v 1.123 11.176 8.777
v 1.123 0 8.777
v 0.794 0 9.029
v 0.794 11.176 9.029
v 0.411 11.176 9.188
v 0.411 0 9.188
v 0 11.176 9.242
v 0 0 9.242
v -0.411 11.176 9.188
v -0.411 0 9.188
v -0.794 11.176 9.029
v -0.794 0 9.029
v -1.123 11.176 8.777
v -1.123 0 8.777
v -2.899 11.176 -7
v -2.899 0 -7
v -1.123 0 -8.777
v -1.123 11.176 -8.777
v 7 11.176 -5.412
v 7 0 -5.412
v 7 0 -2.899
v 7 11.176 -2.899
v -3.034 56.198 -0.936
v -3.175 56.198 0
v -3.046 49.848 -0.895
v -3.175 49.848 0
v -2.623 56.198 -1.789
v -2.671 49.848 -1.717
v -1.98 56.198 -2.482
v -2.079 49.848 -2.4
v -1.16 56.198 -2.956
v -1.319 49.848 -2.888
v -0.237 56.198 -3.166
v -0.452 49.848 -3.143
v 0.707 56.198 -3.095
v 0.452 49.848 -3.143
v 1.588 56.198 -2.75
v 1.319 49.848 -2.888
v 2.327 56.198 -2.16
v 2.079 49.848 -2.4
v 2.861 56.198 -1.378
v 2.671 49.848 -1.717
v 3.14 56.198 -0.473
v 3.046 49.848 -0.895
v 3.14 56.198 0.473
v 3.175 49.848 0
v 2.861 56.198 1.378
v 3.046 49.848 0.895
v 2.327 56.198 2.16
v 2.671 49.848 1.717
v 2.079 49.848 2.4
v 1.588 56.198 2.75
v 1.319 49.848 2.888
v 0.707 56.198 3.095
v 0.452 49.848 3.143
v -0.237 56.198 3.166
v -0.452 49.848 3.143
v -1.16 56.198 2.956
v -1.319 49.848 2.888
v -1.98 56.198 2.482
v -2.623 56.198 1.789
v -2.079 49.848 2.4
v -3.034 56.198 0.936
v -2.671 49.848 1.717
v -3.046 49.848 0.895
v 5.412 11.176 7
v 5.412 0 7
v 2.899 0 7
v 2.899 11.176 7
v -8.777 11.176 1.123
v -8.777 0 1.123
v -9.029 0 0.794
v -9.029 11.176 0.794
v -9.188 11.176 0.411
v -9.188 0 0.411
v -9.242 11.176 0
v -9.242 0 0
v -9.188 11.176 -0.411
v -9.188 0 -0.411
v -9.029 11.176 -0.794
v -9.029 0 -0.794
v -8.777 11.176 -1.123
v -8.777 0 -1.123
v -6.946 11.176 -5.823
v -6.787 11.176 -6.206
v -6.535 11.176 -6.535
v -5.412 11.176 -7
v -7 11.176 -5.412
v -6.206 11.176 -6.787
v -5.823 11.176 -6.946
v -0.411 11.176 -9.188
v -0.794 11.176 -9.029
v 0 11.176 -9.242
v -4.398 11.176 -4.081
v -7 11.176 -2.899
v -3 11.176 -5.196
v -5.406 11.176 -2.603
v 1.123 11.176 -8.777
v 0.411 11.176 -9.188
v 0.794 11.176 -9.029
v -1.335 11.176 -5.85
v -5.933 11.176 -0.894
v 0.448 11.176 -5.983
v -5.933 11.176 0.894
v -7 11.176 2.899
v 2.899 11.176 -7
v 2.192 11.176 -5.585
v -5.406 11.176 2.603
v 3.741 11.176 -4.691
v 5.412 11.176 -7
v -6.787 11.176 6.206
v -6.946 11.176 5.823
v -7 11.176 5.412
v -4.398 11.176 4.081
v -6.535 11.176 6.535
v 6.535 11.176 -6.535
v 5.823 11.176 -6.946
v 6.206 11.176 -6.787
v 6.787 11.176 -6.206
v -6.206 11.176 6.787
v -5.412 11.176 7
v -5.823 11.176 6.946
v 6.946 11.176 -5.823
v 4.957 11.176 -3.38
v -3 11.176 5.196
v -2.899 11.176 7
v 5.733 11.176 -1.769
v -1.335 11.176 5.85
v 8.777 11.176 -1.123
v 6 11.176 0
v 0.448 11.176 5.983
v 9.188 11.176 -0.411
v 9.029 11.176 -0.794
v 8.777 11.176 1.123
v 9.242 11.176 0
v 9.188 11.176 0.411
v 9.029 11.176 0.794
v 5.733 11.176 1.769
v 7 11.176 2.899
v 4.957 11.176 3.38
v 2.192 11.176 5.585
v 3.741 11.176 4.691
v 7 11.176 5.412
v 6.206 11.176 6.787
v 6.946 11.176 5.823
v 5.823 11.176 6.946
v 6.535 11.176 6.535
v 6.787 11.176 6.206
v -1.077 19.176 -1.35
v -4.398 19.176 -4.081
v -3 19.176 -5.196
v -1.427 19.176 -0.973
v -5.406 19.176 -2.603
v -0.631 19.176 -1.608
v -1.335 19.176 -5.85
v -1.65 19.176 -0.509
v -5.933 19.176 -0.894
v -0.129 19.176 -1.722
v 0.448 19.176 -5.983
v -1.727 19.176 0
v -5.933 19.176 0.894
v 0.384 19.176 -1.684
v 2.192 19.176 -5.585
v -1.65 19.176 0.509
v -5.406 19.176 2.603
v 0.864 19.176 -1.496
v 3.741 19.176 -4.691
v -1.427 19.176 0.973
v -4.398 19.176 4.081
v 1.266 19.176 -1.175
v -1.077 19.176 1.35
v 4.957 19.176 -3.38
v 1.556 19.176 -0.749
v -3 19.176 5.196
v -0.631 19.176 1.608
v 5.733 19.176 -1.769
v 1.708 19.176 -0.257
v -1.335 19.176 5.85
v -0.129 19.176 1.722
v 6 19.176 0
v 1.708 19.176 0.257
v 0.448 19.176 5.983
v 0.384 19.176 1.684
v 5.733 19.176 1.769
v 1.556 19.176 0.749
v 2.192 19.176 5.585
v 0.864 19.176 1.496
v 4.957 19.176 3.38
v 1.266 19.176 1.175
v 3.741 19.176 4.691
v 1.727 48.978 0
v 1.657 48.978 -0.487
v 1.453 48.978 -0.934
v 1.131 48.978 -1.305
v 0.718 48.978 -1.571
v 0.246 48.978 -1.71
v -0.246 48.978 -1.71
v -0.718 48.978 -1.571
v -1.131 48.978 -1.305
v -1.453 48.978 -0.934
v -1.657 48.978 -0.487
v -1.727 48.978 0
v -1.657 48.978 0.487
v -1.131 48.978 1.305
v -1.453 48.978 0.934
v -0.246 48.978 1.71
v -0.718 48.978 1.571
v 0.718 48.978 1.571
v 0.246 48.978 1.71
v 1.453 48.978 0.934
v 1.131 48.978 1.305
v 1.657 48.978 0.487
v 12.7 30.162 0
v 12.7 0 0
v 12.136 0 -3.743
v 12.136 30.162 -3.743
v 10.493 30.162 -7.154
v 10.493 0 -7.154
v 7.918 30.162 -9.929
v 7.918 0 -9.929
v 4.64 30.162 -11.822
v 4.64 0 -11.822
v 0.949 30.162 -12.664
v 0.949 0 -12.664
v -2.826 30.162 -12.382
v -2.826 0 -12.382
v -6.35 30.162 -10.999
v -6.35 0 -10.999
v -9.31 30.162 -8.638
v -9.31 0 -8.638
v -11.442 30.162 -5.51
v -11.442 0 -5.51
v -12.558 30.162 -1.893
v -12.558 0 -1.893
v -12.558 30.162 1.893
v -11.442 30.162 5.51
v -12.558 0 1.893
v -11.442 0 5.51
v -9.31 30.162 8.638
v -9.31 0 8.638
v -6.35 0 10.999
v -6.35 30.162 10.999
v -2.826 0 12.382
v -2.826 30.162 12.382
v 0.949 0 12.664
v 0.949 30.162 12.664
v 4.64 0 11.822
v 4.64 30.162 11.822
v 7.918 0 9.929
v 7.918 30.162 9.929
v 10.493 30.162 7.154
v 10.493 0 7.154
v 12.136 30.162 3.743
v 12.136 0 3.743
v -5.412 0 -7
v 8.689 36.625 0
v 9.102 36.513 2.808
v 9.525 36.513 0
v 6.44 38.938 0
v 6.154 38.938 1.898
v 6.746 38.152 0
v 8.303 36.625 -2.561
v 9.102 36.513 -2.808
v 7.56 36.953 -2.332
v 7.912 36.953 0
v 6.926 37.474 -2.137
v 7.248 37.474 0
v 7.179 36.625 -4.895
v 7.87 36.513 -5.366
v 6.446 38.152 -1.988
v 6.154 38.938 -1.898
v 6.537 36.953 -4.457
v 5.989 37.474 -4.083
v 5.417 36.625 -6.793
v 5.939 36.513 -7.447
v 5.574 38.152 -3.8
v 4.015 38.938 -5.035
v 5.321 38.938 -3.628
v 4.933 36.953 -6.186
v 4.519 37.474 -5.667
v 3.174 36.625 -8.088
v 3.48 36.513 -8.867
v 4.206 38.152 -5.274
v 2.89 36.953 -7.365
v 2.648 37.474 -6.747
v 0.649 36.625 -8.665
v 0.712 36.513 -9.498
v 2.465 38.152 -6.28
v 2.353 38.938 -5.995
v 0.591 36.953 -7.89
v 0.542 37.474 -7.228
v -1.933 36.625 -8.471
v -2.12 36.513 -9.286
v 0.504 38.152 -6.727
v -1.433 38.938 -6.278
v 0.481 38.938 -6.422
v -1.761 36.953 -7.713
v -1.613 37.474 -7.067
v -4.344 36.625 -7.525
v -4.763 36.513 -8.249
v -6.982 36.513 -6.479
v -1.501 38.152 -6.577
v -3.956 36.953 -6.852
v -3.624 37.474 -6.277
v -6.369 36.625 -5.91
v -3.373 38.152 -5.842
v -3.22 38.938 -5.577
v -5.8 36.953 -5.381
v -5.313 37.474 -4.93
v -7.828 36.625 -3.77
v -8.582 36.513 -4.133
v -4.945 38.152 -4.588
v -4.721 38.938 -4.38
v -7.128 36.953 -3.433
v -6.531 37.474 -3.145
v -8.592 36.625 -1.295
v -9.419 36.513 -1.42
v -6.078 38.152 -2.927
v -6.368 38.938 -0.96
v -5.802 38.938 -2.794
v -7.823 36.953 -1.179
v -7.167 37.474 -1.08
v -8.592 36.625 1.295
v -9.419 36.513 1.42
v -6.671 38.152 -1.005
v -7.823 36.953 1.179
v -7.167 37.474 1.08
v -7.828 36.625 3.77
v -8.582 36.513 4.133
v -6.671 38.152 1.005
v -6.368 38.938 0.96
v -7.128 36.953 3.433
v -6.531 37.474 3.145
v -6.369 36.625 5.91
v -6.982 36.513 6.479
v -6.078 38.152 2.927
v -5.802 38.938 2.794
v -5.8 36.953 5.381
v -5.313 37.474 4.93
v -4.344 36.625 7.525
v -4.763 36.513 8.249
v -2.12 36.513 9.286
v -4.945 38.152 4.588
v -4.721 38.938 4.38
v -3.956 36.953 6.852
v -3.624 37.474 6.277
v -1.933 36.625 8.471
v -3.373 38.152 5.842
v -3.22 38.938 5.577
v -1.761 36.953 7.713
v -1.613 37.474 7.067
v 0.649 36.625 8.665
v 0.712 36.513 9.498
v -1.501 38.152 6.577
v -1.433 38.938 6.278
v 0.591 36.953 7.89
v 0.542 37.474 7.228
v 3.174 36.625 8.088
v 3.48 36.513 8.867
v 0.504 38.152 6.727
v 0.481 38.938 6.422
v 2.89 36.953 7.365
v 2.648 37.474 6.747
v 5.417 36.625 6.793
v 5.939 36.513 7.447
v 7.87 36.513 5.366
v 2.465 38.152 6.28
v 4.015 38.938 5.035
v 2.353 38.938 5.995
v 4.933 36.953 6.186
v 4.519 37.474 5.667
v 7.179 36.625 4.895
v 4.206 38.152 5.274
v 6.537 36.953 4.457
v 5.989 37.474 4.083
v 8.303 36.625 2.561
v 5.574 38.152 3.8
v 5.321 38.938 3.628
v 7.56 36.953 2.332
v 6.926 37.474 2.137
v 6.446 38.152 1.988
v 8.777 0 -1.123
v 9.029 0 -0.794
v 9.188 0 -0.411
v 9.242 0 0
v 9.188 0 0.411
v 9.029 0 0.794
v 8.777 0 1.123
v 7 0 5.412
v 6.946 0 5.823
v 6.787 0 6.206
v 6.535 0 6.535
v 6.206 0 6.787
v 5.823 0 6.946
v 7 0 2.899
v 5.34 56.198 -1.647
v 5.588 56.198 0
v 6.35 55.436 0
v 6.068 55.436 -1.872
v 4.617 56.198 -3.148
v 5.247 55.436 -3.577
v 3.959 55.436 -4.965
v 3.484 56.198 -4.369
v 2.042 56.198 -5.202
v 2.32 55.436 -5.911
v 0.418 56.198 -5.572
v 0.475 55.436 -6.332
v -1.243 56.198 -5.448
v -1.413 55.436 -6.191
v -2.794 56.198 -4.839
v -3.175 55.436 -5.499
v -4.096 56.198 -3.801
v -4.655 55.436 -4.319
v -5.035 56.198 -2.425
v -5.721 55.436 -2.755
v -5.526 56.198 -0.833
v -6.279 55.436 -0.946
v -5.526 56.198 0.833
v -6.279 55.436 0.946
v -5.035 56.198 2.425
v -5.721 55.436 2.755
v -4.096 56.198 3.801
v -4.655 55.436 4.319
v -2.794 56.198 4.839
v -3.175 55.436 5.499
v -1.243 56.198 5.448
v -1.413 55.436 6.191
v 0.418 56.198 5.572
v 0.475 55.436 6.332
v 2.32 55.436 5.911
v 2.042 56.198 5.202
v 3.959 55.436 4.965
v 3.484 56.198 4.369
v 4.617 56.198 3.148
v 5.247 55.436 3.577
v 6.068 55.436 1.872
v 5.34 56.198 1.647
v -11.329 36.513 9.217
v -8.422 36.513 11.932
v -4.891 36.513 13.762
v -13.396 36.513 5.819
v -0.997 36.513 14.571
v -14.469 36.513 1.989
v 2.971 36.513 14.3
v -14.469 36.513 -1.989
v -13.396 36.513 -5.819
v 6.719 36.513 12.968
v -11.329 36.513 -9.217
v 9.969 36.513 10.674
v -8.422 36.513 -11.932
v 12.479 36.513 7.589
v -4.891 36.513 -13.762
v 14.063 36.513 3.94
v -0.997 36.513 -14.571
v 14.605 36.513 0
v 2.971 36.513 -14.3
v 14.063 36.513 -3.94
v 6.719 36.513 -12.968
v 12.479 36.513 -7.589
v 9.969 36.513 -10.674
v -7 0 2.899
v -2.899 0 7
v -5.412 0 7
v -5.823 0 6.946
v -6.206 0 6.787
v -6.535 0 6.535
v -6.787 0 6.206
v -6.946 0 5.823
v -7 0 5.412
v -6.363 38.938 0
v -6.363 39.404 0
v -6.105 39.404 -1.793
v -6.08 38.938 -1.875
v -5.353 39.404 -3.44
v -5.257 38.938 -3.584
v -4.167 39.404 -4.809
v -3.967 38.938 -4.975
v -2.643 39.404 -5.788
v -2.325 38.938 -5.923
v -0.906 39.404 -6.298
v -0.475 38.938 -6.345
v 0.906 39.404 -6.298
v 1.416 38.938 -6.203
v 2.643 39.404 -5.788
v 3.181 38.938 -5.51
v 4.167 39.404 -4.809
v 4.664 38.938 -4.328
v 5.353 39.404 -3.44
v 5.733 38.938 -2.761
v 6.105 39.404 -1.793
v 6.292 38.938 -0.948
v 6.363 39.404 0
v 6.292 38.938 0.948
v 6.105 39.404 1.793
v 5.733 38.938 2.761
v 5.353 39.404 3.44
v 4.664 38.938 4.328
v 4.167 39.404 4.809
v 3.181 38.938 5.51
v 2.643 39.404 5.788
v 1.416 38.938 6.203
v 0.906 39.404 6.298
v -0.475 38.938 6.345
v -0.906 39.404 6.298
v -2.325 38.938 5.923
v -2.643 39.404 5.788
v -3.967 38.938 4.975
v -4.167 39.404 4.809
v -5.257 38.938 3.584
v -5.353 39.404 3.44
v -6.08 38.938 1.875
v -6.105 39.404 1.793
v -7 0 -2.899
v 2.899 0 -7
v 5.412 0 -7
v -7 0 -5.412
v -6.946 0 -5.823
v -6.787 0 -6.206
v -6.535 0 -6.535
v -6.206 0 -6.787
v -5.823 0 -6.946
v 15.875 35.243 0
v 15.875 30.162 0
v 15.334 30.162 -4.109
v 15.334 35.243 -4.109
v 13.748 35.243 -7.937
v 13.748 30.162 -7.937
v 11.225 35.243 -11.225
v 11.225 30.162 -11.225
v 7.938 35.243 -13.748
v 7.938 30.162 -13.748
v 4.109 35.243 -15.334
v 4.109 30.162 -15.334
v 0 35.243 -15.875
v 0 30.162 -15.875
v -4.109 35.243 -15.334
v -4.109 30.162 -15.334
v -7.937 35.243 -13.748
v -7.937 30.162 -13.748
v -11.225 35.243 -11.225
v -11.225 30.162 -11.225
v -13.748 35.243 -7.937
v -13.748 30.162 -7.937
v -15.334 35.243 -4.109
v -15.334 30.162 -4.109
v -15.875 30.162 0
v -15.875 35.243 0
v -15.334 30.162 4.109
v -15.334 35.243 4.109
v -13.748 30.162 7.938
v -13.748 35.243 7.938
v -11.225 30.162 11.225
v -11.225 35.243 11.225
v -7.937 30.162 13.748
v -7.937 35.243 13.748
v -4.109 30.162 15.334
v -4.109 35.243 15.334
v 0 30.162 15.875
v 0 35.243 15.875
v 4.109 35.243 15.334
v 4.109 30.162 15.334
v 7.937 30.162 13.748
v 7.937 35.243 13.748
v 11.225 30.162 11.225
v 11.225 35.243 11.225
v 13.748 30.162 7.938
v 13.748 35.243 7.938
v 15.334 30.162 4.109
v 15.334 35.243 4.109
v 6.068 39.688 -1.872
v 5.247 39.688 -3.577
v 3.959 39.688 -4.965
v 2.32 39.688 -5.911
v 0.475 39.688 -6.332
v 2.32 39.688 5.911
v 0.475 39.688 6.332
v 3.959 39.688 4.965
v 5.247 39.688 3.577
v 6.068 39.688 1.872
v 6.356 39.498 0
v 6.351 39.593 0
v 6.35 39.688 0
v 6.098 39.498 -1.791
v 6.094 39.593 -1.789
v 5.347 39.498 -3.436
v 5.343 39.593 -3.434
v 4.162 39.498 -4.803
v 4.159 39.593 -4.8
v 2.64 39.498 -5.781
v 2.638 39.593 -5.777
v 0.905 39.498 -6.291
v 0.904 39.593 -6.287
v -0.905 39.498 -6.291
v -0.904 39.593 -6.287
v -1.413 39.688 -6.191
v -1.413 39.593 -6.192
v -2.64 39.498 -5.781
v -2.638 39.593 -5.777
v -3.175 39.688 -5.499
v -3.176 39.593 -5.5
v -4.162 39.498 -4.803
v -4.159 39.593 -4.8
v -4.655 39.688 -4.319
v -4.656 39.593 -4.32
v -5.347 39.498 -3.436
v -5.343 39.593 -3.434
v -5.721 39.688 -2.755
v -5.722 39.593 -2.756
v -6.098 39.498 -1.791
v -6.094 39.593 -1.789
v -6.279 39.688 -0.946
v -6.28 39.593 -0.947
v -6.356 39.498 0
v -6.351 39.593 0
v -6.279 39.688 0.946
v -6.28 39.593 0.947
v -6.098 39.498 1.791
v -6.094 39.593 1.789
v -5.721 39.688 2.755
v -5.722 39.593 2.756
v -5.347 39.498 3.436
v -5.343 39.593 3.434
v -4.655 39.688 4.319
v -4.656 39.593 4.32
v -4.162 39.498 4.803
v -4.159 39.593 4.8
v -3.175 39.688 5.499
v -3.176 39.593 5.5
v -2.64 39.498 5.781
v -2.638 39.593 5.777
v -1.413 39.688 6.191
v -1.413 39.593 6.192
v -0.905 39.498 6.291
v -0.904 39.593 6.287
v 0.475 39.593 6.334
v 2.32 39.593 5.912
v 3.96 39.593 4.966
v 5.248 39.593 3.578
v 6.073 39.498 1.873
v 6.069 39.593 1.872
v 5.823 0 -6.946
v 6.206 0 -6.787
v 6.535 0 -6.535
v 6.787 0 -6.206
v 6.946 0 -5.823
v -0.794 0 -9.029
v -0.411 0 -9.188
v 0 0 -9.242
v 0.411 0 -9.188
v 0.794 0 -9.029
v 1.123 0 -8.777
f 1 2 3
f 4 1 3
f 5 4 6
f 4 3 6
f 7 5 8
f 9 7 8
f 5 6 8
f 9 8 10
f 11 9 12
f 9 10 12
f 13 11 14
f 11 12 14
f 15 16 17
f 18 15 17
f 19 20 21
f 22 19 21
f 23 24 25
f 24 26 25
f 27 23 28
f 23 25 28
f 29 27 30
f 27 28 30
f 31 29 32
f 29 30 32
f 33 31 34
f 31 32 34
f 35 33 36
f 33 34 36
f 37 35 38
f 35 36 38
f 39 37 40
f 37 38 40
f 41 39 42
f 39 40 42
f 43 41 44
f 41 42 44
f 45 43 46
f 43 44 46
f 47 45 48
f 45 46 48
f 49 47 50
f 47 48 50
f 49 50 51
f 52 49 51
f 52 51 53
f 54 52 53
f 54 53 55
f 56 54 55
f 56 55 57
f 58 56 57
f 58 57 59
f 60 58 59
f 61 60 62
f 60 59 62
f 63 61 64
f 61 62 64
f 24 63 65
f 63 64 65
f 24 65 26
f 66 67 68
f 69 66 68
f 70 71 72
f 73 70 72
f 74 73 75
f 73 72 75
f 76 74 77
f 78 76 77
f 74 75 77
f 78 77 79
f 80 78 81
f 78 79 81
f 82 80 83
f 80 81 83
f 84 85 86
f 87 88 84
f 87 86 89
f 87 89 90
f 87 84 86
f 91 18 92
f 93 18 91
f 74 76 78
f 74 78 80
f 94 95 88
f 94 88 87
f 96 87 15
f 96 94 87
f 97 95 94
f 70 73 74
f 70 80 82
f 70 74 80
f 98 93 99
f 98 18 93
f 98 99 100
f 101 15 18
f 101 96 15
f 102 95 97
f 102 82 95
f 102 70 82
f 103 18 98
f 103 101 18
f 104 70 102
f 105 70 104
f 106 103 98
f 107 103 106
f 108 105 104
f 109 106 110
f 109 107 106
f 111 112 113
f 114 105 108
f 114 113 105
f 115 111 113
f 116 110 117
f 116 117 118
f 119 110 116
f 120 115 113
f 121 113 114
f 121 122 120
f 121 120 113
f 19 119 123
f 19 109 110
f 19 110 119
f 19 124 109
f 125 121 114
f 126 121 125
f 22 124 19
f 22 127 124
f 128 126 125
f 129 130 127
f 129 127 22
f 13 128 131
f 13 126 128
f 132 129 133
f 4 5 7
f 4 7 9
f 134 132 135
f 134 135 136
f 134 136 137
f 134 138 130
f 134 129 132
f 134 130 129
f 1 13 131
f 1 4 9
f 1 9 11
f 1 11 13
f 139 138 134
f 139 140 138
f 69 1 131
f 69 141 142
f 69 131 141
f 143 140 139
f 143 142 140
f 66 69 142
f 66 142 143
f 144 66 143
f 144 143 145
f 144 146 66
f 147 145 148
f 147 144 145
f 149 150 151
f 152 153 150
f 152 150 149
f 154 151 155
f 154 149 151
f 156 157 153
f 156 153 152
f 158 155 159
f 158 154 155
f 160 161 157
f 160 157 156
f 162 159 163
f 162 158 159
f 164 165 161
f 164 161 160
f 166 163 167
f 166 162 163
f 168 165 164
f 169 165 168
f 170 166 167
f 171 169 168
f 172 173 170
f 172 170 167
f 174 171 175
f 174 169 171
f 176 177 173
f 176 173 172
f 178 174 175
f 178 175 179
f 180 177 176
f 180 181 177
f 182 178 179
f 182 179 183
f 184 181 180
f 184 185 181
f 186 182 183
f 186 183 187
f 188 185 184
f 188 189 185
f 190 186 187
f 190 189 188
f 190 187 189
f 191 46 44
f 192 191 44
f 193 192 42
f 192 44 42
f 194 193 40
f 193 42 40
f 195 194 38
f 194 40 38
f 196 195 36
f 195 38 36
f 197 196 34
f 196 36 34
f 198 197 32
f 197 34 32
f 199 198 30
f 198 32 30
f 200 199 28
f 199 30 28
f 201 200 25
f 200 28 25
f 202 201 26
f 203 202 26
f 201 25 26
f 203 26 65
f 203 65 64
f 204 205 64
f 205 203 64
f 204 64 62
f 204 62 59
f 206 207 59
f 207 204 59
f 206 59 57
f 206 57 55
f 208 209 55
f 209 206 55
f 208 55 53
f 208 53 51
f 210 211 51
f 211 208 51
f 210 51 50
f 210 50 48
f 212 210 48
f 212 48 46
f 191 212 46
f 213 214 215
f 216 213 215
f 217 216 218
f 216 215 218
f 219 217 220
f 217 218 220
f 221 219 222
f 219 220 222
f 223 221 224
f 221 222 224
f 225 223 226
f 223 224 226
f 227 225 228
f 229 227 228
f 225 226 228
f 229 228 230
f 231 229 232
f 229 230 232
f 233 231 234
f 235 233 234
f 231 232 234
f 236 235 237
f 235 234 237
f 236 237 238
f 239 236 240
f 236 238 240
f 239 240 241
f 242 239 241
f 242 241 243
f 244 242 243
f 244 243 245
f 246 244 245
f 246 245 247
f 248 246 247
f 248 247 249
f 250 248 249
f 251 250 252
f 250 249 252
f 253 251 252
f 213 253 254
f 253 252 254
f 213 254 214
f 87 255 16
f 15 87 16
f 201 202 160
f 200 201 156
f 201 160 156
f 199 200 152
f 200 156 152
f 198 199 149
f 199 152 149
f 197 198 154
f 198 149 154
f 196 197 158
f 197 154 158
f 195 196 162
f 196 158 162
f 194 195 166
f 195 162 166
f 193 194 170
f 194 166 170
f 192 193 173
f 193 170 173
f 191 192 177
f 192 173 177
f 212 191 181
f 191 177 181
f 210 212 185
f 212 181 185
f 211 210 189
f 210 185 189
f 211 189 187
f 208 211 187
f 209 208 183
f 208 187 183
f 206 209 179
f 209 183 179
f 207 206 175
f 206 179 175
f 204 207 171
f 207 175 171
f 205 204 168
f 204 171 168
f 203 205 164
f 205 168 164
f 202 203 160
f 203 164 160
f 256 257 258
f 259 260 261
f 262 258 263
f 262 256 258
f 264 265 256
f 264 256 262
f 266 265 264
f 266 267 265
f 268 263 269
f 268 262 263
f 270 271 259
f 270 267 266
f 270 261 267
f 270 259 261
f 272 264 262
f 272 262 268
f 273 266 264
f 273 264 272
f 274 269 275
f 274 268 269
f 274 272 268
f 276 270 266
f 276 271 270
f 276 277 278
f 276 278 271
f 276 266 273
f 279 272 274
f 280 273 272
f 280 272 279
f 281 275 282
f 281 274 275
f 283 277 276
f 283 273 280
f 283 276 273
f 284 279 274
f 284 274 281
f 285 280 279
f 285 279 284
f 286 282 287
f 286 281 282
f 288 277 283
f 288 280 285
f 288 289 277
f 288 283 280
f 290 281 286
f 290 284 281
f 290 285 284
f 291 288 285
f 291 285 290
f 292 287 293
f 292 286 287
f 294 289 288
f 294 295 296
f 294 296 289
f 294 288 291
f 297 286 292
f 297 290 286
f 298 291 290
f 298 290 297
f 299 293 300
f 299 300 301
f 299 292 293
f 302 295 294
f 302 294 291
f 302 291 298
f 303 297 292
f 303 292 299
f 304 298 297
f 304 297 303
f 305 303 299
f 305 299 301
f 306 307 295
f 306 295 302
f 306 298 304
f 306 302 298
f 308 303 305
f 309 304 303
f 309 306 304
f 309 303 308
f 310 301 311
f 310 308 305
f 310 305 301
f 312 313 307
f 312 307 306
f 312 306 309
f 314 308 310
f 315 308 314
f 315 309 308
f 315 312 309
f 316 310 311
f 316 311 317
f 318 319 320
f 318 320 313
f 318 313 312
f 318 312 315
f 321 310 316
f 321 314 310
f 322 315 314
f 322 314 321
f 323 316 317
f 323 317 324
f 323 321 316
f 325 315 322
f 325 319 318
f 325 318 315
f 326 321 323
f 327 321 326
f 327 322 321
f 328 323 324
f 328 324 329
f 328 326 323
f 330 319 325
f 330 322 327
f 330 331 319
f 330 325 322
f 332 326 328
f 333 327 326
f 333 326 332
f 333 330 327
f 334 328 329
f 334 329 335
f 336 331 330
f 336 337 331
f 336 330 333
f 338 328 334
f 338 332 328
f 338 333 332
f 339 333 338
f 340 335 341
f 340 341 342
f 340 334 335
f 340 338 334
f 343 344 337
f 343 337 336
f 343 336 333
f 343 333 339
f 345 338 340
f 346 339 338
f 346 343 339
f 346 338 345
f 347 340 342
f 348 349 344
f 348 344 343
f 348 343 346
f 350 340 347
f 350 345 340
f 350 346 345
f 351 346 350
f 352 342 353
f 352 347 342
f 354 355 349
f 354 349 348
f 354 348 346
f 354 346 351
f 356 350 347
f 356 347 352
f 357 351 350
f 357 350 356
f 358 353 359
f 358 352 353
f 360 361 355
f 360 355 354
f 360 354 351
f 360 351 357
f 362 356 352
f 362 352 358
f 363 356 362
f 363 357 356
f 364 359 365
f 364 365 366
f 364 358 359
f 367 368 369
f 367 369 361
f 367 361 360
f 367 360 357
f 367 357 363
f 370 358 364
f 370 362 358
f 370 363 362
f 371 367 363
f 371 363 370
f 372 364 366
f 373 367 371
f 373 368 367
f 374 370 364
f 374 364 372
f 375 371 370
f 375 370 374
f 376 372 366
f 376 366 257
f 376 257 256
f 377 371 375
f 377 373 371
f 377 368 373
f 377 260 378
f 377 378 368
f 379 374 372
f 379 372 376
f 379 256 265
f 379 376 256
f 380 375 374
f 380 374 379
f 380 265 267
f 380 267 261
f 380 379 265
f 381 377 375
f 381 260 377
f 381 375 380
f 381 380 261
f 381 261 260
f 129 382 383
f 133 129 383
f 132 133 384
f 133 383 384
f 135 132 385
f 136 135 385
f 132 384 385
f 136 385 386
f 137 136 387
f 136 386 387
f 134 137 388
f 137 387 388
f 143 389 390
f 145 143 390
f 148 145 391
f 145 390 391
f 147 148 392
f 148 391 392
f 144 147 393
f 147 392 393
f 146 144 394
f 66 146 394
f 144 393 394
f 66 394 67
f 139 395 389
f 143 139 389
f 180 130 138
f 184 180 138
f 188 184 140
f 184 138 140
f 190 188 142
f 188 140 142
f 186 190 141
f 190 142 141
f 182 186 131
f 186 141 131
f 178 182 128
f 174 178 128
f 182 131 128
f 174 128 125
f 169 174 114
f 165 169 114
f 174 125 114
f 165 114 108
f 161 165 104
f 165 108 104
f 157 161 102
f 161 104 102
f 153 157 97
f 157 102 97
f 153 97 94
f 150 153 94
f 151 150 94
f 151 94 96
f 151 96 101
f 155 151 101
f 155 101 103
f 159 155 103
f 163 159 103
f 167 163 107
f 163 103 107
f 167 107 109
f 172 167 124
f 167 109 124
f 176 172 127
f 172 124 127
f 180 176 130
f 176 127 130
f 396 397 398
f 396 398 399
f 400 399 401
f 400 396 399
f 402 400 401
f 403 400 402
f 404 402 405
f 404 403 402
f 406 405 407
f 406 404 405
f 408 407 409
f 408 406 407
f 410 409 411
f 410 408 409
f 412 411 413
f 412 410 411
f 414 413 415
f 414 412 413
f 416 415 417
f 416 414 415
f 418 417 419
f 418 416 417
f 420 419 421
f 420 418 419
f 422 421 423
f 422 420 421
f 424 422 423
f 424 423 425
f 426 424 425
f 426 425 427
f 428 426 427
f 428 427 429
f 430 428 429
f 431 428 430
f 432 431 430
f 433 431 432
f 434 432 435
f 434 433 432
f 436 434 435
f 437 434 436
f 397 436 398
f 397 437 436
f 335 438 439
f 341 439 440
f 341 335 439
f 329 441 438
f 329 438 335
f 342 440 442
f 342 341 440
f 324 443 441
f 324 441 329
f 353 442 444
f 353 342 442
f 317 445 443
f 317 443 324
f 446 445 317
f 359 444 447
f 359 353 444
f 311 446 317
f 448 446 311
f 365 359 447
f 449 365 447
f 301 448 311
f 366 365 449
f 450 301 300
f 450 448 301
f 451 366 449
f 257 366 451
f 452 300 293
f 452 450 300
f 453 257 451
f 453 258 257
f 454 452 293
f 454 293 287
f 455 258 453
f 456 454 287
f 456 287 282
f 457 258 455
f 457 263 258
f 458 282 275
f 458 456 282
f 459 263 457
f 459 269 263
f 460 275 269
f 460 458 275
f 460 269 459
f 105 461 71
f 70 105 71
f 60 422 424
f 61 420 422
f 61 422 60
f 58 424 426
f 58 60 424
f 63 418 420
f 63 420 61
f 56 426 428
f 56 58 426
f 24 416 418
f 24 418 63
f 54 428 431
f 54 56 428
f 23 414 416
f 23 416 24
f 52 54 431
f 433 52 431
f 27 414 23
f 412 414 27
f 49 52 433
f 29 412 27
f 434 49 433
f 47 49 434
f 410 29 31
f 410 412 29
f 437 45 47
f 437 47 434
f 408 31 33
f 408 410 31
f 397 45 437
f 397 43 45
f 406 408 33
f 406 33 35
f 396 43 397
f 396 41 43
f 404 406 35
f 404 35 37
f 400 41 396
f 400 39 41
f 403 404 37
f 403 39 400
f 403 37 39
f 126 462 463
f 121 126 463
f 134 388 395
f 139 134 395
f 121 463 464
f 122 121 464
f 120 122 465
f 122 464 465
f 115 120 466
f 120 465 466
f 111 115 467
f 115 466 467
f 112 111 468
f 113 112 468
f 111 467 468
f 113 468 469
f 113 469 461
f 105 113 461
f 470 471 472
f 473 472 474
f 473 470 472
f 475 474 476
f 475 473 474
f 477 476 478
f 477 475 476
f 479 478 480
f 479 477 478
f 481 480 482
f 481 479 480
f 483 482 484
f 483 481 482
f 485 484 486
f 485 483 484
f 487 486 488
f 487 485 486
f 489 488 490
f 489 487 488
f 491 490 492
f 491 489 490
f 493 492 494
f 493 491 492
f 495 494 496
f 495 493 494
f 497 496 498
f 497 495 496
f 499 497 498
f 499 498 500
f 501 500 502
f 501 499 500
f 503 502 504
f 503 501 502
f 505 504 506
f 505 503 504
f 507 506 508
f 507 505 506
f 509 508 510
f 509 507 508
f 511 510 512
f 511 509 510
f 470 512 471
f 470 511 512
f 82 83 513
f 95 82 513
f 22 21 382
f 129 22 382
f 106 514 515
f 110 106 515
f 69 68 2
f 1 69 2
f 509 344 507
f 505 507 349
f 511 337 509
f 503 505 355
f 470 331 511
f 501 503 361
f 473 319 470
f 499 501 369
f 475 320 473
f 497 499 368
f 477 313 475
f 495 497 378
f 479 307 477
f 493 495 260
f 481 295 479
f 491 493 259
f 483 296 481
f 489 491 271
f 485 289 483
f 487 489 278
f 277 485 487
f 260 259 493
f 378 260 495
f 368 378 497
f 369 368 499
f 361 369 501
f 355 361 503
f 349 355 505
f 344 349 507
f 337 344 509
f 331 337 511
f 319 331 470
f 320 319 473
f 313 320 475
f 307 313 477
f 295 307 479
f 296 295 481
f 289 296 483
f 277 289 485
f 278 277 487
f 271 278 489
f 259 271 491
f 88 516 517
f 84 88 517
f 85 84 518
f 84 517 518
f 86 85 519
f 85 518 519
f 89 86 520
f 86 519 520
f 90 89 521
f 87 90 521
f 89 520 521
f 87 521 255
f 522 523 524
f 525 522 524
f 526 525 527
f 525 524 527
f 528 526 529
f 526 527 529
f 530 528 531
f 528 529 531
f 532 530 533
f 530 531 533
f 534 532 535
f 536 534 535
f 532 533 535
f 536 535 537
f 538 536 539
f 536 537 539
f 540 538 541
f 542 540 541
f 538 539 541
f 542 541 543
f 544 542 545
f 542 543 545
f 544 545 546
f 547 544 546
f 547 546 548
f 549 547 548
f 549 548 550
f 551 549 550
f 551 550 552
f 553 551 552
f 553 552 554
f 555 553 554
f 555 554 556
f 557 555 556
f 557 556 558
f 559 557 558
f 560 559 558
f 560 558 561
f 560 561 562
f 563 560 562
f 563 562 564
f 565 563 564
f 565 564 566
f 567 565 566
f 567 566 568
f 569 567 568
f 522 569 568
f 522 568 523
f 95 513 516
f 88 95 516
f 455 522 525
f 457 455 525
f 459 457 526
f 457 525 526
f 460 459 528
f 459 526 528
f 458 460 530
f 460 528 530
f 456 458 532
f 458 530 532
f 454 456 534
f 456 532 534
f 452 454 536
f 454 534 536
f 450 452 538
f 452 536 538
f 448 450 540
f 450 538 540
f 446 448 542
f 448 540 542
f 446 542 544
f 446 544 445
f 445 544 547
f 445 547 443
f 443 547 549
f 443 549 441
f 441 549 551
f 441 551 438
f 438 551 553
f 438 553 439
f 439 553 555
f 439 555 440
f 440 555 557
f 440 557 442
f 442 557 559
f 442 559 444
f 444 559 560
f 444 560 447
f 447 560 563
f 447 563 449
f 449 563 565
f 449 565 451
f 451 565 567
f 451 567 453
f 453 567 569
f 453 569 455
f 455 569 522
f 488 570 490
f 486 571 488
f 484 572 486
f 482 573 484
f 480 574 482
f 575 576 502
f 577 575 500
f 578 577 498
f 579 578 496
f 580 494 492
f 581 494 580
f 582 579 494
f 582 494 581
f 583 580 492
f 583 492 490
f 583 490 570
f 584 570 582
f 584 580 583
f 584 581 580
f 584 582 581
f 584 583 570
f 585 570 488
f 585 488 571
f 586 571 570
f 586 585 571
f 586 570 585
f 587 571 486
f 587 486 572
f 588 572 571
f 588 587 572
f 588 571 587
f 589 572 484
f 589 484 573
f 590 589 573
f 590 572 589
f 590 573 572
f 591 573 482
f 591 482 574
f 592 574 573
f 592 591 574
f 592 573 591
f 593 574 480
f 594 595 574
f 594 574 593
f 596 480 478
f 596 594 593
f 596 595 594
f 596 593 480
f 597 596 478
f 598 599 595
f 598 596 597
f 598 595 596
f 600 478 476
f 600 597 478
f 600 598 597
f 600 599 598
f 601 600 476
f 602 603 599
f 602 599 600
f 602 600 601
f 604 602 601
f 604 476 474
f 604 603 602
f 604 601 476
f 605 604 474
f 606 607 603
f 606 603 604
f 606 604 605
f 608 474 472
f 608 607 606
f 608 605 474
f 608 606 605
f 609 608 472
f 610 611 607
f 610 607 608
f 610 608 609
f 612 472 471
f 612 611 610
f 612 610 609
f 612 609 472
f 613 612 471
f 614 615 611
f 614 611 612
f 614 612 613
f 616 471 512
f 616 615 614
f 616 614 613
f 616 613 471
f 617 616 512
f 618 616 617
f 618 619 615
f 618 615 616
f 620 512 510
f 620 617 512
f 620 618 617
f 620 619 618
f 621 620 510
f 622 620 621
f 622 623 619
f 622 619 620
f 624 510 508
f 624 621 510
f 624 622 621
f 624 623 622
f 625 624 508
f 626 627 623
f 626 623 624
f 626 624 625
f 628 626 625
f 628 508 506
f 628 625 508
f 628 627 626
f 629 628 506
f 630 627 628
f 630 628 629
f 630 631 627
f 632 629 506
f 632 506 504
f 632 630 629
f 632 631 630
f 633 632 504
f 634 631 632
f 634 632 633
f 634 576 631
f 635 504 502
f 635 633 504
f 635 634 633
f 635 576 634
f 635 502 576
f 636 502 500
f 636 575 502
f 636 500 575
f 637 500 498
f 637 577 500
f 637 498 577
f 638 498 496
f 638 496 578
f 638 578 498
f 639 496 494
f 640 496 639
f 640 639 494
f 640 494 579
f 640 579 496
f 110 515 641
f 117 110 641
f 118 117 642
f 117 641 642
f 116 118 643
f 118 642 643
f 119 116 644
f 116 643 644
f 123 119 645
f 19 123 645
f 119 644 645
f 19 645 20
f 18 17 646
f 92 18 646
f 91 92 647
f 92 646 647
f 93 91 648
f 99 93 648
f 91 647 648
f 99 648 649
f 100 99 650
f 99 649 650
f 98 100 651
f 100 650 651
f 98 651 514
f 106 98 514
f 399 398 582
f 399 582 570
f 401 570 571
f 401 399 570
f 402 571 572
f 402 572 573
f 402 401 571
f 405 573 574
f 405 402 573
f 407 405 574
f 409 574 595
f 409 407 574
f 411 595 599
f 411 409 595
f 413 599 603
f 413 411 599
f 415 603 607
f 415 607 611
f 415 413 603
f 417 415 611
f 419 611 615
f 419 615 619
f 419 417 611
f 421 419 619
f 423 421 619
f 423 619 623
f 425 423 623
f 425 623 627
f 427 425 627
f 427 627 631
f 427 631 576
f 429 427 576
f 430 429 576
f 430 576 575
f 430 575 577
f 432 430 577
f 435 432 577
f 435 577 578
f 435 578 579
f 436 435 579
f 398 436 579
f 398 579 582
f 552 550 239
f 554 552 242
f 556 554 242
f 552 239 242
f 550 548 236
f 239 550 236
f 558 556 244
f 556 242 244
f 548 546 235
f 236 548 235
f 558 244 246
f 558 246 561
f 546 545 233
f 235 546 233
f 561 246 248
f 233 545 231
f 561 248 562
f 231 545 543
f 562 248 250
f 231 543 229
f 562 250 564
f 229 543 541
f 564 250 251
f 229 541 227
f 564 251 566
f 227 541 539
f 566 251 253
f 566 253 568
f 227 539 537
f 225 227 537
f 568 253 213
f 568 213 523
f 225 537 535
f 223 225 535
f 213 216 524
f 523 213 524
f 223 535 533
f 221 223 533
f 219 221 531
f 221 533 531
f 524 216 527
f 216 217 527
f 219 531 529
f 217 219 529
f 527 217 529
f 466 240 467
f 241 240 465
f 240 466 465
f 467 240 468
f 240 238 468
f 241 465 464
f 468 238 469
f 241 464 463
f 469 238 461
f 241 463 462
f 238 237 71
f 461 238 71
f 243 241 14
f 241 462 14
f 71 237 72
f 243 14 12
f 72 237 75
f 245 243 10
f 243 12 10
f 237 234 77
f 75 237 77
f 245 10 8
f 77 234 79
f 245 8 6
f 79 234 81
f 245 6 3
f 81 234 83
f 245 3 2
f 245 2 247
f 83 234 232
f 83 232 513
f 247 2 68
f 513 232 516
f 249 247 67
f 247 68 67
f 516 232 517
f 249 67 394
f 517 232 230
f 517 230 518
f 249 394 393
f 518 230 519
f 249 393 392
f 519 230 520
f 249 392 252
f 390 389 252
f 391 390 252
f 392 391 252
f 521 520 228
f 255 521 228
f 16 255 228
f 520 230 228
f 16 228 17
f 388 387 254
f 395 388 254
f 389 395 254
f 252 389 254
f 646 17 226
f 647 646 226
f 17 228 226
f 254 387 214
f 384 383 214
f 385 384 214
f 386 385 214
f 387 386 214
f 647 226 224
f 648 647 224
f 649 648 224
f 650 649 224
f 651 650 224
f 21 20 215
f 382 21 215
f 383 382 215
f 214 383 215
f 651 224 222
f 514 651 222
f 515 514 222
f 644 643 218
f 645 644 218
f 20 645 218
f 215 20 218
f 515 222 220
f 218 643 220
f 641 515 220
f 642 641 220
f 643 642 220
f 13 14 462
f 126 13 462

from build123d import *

# Parameters (mm, degrees)
SKETCH1_R                       = 12.7
BOSS_EXTRUDE1_DEPTH             = 30.1625
SKETCH4_R                       = 15.875
BOSS_EXTRUDE2_DEPTH             = 50.8
CUT_EXTRUDE1_DEPTH              = 11.176
SKETCH3_R                       = 6
CUT_EXTRUDE2_DEPTH              = 8
SKETCH5_R                       = 3.175
BOSS_EXTRUDE3_DEPTH             = 6.604
F_8_32_TAPPED_HOLE1_D           = 3.4544
CUT_EXTRUDE3_START              = -6.35
SKETCH9_R                       = 15.875
SKETCH9_R_2                     = 6.35
CUT_EXTRUDE3_DEPTH              = 38.1
FILLET1_R                       = 3.175
CHAMFER1_SIZE                   = 1.27
F_1_4_0_25_DIAMETER_HOLE1_D     = 6.35
F_1_4_0_25_DIAMETER_HOLE1_DEPTH = 6.35
F_1_4_0_25_DIAMETER_HOLE1_TIP   = 1.907732465
CHAMFER2_SIZE                   = 0.762


with BuildPart() as part:
    # Sketch1 → Boss-Extrude1 (new body)
    with BuildSketch(Plane(origin=(0, 0, 0), x_dir=(1, 0, 0), z_dir=(0, 1, 0))):
        Circle(SKETCH1_R)
    extrude(amount=BOSS_EXTRUDE1_DEPTH)

    # Sketch4 → Boss-Extrude2 (add)
    with BuildSketch(Plane(origin=(0, 30.1625, 0), x_dir=(1, 0, 0), z_dir=(0, 1, 0))):
        Circle(SKETCH4_R)
    extrude(amount=BOSS_EXTRUDE2_DEPTH)

    # Sketch2 → Cut-Extrude1 (cut)
    with BuildSketch(Plane.XZ):
        with BuildLine():
            Line((-7, 2.899494937), (-8.776962921, 1.122532015))
            ThreePointArc((-8.776962921, 1.122532015), (-9.241930906, 0), (-8.776962921, -1.122532015))
            Line((-8.776962921, -1.122532015), (-7, -2.899494937))
            Line((-7, -2.899494937), (-7, 2.899494937))
        make_face()
        Polygon((-2.899494937, 7), (-7, 2.899494937), (-7, -2.899494937), (-2.899494937, -7), (2.899494937, -7), (7, -2.899494937), (7, 2.899494937), (2.899494937, 7), align=None)
        with BuildLine():
            Line((-7, 5.4125), (-7, 2.899494937))
            Line((-7, 2.899494937), (-2.899494937, 7))
            Line((-2.899494937, 7), (-5.4125, 7))
            ThreePointArc((-5.4125, 7), (-6.535032015, 6.535032015), (-7, 5.4125))
        make_face()
        with BuildLine():
            Line((-1.122532015, 8.776962921), (-2.899494937, 7))
            Line((-2.899494937, 7), (2.899494937, 7))
            Line((2.899494937, 7), (1.122532015, 8.776962921))
            ThreePointArc((1.122532015, 8.776962921), (0, 9.241930906), (-1.122532015, 8.776962921))
        make_face()
        with BuildLine():
            Line((5.4125, 7), (2.899494937, 7))
            Line((2.899494937, 7), (7, 2.899494937))
            Line((7, 2.899494937), (7, 5.4125))
            ThreePointArc((7, 5.4125), (6.535032015, 6.535032015), (5.4125, 7))
        make_face()
        with BuildLine():
            Line((8.776962921, 1.122532015), (7, 2.899494937))
            Line((7, 2.899494937), (7, -2.899494937))
            Line((7, -2.899494937), (8.776962921, -1.122532015))
            ThreePointArc((8.776962921, -1.122532015), (9.241930906, 0), (8.776962921, 1.122532015))
        make_face()
        with BuildLine():
            Line((7, -2.899494937), (2.899494937, -7))
            Line((2.899494937, -7), (5.4125, -7))
            ThreePointArc((5.4125, -7), (6.535032015, -6.535032015), (7, -5.4125))
            Line((7, -5.4125), (7, -2.899494937))
        make_face()
        with BuildLine():
            Line((2.899494937, -7), (-2.899494937, -7))
            Line((-2.899494937, -7), (-1.122532015, -8.776962921))
            ThreePointArc((-1.122532015, -8.776962921), (0, -9.241930906), (1.122532015, -8.776962921))
            Line((1.122532015, -8.776962921), (2.899494937, -7))
        make_face()
        with BuildLine():
            Line((-2.899494937, -7), (-7, -2.899494937))
            Line((-7, -2.899494937), (-7, -5.4125))
            ThreePointArc((-7, -5.4125), (-6.535032015, -6.535032015), (-5.4125, -7))
            Line((-5.4125, -7), (-2.899494937, -7))
        make_face()
    extrude(amount=-CUT_EXTRUDE1_DEPTH, mode=Mode.SUBTRACT)

    # Sketch3 → Cut-Extrude2 (cut)
    with BuildSketch(Plane.XZ.offset(-11.176)):
        Circle(SKETCH3_R)
    extrude(amount=-CUT_EXTRUDE2_DEPTH, mode=Mode.SUBTRACT)

    # Sketch5 → Boss-Extrude3 (add)
    with BuildSketch(Plane(origin=(0, 80.9625, 0), x_dir=(1, 0, 0), z_dir=(0, 1, 0))):
        Circle(SKETCH5_R)
    extrude(amount=BOSS_EXTRUDE3_DEPTH)

    # #8-32 Tapped Hole1 (through all)
    with Locations(Plane(origin=(0, 87.5665, 0), x_dir=(1, 0, 0), z_dir=(0, 1, 0))):
        with Locations((0, 0)):
            Hole(F_8_32_TAPPED_HOLE1_D / 2)

    # Sketch9 → Cut-Extrude3 (cut)
    with BuildSketch(Plane(origin=(0, 80.9625, 0), x_dir=(1, 0, 0), z_dir=(0, 1, 0)).offset(CUT_EXTRUDE3_START)):
        Circle(SKETCH9_R)
        Circle(SKETCH9_R_2, mode=Mode.SUBTRACT)
    extrude(amount=-CUT_EXTRUDE3_DEPTH, mode=Mode.SUBTRACT)

    # Fillet1
    fillet1_edges = [part.edges().sort_by_distance(p)[0] for p in [
        (-6.35, 36.5125, 0),
        (-6.35, 74.6125, 0),
    ]]
    fillet(fillet1_edges, radius=FILLET1_R)

    # Chamfer1
    chamfer1_edges = [part.edges().sort_by_distance(p)[0] for p in [
        (-15.875, 36.5125, 0),
    ]]
    chamfer(chamfer1_edges, length=CHAMFER1_SIZE)

    # Sketch10 → Cut-Revolve1 (revolve, cut)
    with BuildSketch(Plane.XY):
        Polygon((0, 87.5665), (0, 56.1975), (-6.3627, 56.1975), (-6.3627, 38.9382), (-15.875, 38.9382), (-15.875, 87.5665), align=None)
    revolve(axis=Axis((0, 87.5665, 0), (0, -1, 0)), mode=Mode.SUBTRACT)

    # 1/4 (0.25) Diameter Hole1
    with Locations(Plane(origin=(0, 56.1975, 0), x_dir=(1, 0, 0), z_dir=(0, 1, 0))):
        with Locations((0, 0)):
            Hole(F_1_4_0_25_DIAMETER_HOLE1_D / 2, depth=F_1_4_0_25_DIAMETER_HOLE1_DEPTH)
            with Locations((0, 0, -(F_1_4_0_25_DIAMETER_HOLE1_DEPTH + F_1_4_0_25_DIAMETER_HOLE1_TIP / 2))):  # 118° drill point
                Cone(0, F_1_4_0_25_DIAMETER_HOLE1_D / 2, F_1_4_0_25_DIAMETER_HOLE1_TIP, mode=Mode.SUBTRACT)

    # Chamfer2
    chamfer2_edges = [part.edges().sort_by_distance(p)[0] for p in [
        (-6.35, 56.1975, 0),
    ]]
    chamfer(chamfer2_edges, length=CHAMFER2_SIZE)


solid = part.part
